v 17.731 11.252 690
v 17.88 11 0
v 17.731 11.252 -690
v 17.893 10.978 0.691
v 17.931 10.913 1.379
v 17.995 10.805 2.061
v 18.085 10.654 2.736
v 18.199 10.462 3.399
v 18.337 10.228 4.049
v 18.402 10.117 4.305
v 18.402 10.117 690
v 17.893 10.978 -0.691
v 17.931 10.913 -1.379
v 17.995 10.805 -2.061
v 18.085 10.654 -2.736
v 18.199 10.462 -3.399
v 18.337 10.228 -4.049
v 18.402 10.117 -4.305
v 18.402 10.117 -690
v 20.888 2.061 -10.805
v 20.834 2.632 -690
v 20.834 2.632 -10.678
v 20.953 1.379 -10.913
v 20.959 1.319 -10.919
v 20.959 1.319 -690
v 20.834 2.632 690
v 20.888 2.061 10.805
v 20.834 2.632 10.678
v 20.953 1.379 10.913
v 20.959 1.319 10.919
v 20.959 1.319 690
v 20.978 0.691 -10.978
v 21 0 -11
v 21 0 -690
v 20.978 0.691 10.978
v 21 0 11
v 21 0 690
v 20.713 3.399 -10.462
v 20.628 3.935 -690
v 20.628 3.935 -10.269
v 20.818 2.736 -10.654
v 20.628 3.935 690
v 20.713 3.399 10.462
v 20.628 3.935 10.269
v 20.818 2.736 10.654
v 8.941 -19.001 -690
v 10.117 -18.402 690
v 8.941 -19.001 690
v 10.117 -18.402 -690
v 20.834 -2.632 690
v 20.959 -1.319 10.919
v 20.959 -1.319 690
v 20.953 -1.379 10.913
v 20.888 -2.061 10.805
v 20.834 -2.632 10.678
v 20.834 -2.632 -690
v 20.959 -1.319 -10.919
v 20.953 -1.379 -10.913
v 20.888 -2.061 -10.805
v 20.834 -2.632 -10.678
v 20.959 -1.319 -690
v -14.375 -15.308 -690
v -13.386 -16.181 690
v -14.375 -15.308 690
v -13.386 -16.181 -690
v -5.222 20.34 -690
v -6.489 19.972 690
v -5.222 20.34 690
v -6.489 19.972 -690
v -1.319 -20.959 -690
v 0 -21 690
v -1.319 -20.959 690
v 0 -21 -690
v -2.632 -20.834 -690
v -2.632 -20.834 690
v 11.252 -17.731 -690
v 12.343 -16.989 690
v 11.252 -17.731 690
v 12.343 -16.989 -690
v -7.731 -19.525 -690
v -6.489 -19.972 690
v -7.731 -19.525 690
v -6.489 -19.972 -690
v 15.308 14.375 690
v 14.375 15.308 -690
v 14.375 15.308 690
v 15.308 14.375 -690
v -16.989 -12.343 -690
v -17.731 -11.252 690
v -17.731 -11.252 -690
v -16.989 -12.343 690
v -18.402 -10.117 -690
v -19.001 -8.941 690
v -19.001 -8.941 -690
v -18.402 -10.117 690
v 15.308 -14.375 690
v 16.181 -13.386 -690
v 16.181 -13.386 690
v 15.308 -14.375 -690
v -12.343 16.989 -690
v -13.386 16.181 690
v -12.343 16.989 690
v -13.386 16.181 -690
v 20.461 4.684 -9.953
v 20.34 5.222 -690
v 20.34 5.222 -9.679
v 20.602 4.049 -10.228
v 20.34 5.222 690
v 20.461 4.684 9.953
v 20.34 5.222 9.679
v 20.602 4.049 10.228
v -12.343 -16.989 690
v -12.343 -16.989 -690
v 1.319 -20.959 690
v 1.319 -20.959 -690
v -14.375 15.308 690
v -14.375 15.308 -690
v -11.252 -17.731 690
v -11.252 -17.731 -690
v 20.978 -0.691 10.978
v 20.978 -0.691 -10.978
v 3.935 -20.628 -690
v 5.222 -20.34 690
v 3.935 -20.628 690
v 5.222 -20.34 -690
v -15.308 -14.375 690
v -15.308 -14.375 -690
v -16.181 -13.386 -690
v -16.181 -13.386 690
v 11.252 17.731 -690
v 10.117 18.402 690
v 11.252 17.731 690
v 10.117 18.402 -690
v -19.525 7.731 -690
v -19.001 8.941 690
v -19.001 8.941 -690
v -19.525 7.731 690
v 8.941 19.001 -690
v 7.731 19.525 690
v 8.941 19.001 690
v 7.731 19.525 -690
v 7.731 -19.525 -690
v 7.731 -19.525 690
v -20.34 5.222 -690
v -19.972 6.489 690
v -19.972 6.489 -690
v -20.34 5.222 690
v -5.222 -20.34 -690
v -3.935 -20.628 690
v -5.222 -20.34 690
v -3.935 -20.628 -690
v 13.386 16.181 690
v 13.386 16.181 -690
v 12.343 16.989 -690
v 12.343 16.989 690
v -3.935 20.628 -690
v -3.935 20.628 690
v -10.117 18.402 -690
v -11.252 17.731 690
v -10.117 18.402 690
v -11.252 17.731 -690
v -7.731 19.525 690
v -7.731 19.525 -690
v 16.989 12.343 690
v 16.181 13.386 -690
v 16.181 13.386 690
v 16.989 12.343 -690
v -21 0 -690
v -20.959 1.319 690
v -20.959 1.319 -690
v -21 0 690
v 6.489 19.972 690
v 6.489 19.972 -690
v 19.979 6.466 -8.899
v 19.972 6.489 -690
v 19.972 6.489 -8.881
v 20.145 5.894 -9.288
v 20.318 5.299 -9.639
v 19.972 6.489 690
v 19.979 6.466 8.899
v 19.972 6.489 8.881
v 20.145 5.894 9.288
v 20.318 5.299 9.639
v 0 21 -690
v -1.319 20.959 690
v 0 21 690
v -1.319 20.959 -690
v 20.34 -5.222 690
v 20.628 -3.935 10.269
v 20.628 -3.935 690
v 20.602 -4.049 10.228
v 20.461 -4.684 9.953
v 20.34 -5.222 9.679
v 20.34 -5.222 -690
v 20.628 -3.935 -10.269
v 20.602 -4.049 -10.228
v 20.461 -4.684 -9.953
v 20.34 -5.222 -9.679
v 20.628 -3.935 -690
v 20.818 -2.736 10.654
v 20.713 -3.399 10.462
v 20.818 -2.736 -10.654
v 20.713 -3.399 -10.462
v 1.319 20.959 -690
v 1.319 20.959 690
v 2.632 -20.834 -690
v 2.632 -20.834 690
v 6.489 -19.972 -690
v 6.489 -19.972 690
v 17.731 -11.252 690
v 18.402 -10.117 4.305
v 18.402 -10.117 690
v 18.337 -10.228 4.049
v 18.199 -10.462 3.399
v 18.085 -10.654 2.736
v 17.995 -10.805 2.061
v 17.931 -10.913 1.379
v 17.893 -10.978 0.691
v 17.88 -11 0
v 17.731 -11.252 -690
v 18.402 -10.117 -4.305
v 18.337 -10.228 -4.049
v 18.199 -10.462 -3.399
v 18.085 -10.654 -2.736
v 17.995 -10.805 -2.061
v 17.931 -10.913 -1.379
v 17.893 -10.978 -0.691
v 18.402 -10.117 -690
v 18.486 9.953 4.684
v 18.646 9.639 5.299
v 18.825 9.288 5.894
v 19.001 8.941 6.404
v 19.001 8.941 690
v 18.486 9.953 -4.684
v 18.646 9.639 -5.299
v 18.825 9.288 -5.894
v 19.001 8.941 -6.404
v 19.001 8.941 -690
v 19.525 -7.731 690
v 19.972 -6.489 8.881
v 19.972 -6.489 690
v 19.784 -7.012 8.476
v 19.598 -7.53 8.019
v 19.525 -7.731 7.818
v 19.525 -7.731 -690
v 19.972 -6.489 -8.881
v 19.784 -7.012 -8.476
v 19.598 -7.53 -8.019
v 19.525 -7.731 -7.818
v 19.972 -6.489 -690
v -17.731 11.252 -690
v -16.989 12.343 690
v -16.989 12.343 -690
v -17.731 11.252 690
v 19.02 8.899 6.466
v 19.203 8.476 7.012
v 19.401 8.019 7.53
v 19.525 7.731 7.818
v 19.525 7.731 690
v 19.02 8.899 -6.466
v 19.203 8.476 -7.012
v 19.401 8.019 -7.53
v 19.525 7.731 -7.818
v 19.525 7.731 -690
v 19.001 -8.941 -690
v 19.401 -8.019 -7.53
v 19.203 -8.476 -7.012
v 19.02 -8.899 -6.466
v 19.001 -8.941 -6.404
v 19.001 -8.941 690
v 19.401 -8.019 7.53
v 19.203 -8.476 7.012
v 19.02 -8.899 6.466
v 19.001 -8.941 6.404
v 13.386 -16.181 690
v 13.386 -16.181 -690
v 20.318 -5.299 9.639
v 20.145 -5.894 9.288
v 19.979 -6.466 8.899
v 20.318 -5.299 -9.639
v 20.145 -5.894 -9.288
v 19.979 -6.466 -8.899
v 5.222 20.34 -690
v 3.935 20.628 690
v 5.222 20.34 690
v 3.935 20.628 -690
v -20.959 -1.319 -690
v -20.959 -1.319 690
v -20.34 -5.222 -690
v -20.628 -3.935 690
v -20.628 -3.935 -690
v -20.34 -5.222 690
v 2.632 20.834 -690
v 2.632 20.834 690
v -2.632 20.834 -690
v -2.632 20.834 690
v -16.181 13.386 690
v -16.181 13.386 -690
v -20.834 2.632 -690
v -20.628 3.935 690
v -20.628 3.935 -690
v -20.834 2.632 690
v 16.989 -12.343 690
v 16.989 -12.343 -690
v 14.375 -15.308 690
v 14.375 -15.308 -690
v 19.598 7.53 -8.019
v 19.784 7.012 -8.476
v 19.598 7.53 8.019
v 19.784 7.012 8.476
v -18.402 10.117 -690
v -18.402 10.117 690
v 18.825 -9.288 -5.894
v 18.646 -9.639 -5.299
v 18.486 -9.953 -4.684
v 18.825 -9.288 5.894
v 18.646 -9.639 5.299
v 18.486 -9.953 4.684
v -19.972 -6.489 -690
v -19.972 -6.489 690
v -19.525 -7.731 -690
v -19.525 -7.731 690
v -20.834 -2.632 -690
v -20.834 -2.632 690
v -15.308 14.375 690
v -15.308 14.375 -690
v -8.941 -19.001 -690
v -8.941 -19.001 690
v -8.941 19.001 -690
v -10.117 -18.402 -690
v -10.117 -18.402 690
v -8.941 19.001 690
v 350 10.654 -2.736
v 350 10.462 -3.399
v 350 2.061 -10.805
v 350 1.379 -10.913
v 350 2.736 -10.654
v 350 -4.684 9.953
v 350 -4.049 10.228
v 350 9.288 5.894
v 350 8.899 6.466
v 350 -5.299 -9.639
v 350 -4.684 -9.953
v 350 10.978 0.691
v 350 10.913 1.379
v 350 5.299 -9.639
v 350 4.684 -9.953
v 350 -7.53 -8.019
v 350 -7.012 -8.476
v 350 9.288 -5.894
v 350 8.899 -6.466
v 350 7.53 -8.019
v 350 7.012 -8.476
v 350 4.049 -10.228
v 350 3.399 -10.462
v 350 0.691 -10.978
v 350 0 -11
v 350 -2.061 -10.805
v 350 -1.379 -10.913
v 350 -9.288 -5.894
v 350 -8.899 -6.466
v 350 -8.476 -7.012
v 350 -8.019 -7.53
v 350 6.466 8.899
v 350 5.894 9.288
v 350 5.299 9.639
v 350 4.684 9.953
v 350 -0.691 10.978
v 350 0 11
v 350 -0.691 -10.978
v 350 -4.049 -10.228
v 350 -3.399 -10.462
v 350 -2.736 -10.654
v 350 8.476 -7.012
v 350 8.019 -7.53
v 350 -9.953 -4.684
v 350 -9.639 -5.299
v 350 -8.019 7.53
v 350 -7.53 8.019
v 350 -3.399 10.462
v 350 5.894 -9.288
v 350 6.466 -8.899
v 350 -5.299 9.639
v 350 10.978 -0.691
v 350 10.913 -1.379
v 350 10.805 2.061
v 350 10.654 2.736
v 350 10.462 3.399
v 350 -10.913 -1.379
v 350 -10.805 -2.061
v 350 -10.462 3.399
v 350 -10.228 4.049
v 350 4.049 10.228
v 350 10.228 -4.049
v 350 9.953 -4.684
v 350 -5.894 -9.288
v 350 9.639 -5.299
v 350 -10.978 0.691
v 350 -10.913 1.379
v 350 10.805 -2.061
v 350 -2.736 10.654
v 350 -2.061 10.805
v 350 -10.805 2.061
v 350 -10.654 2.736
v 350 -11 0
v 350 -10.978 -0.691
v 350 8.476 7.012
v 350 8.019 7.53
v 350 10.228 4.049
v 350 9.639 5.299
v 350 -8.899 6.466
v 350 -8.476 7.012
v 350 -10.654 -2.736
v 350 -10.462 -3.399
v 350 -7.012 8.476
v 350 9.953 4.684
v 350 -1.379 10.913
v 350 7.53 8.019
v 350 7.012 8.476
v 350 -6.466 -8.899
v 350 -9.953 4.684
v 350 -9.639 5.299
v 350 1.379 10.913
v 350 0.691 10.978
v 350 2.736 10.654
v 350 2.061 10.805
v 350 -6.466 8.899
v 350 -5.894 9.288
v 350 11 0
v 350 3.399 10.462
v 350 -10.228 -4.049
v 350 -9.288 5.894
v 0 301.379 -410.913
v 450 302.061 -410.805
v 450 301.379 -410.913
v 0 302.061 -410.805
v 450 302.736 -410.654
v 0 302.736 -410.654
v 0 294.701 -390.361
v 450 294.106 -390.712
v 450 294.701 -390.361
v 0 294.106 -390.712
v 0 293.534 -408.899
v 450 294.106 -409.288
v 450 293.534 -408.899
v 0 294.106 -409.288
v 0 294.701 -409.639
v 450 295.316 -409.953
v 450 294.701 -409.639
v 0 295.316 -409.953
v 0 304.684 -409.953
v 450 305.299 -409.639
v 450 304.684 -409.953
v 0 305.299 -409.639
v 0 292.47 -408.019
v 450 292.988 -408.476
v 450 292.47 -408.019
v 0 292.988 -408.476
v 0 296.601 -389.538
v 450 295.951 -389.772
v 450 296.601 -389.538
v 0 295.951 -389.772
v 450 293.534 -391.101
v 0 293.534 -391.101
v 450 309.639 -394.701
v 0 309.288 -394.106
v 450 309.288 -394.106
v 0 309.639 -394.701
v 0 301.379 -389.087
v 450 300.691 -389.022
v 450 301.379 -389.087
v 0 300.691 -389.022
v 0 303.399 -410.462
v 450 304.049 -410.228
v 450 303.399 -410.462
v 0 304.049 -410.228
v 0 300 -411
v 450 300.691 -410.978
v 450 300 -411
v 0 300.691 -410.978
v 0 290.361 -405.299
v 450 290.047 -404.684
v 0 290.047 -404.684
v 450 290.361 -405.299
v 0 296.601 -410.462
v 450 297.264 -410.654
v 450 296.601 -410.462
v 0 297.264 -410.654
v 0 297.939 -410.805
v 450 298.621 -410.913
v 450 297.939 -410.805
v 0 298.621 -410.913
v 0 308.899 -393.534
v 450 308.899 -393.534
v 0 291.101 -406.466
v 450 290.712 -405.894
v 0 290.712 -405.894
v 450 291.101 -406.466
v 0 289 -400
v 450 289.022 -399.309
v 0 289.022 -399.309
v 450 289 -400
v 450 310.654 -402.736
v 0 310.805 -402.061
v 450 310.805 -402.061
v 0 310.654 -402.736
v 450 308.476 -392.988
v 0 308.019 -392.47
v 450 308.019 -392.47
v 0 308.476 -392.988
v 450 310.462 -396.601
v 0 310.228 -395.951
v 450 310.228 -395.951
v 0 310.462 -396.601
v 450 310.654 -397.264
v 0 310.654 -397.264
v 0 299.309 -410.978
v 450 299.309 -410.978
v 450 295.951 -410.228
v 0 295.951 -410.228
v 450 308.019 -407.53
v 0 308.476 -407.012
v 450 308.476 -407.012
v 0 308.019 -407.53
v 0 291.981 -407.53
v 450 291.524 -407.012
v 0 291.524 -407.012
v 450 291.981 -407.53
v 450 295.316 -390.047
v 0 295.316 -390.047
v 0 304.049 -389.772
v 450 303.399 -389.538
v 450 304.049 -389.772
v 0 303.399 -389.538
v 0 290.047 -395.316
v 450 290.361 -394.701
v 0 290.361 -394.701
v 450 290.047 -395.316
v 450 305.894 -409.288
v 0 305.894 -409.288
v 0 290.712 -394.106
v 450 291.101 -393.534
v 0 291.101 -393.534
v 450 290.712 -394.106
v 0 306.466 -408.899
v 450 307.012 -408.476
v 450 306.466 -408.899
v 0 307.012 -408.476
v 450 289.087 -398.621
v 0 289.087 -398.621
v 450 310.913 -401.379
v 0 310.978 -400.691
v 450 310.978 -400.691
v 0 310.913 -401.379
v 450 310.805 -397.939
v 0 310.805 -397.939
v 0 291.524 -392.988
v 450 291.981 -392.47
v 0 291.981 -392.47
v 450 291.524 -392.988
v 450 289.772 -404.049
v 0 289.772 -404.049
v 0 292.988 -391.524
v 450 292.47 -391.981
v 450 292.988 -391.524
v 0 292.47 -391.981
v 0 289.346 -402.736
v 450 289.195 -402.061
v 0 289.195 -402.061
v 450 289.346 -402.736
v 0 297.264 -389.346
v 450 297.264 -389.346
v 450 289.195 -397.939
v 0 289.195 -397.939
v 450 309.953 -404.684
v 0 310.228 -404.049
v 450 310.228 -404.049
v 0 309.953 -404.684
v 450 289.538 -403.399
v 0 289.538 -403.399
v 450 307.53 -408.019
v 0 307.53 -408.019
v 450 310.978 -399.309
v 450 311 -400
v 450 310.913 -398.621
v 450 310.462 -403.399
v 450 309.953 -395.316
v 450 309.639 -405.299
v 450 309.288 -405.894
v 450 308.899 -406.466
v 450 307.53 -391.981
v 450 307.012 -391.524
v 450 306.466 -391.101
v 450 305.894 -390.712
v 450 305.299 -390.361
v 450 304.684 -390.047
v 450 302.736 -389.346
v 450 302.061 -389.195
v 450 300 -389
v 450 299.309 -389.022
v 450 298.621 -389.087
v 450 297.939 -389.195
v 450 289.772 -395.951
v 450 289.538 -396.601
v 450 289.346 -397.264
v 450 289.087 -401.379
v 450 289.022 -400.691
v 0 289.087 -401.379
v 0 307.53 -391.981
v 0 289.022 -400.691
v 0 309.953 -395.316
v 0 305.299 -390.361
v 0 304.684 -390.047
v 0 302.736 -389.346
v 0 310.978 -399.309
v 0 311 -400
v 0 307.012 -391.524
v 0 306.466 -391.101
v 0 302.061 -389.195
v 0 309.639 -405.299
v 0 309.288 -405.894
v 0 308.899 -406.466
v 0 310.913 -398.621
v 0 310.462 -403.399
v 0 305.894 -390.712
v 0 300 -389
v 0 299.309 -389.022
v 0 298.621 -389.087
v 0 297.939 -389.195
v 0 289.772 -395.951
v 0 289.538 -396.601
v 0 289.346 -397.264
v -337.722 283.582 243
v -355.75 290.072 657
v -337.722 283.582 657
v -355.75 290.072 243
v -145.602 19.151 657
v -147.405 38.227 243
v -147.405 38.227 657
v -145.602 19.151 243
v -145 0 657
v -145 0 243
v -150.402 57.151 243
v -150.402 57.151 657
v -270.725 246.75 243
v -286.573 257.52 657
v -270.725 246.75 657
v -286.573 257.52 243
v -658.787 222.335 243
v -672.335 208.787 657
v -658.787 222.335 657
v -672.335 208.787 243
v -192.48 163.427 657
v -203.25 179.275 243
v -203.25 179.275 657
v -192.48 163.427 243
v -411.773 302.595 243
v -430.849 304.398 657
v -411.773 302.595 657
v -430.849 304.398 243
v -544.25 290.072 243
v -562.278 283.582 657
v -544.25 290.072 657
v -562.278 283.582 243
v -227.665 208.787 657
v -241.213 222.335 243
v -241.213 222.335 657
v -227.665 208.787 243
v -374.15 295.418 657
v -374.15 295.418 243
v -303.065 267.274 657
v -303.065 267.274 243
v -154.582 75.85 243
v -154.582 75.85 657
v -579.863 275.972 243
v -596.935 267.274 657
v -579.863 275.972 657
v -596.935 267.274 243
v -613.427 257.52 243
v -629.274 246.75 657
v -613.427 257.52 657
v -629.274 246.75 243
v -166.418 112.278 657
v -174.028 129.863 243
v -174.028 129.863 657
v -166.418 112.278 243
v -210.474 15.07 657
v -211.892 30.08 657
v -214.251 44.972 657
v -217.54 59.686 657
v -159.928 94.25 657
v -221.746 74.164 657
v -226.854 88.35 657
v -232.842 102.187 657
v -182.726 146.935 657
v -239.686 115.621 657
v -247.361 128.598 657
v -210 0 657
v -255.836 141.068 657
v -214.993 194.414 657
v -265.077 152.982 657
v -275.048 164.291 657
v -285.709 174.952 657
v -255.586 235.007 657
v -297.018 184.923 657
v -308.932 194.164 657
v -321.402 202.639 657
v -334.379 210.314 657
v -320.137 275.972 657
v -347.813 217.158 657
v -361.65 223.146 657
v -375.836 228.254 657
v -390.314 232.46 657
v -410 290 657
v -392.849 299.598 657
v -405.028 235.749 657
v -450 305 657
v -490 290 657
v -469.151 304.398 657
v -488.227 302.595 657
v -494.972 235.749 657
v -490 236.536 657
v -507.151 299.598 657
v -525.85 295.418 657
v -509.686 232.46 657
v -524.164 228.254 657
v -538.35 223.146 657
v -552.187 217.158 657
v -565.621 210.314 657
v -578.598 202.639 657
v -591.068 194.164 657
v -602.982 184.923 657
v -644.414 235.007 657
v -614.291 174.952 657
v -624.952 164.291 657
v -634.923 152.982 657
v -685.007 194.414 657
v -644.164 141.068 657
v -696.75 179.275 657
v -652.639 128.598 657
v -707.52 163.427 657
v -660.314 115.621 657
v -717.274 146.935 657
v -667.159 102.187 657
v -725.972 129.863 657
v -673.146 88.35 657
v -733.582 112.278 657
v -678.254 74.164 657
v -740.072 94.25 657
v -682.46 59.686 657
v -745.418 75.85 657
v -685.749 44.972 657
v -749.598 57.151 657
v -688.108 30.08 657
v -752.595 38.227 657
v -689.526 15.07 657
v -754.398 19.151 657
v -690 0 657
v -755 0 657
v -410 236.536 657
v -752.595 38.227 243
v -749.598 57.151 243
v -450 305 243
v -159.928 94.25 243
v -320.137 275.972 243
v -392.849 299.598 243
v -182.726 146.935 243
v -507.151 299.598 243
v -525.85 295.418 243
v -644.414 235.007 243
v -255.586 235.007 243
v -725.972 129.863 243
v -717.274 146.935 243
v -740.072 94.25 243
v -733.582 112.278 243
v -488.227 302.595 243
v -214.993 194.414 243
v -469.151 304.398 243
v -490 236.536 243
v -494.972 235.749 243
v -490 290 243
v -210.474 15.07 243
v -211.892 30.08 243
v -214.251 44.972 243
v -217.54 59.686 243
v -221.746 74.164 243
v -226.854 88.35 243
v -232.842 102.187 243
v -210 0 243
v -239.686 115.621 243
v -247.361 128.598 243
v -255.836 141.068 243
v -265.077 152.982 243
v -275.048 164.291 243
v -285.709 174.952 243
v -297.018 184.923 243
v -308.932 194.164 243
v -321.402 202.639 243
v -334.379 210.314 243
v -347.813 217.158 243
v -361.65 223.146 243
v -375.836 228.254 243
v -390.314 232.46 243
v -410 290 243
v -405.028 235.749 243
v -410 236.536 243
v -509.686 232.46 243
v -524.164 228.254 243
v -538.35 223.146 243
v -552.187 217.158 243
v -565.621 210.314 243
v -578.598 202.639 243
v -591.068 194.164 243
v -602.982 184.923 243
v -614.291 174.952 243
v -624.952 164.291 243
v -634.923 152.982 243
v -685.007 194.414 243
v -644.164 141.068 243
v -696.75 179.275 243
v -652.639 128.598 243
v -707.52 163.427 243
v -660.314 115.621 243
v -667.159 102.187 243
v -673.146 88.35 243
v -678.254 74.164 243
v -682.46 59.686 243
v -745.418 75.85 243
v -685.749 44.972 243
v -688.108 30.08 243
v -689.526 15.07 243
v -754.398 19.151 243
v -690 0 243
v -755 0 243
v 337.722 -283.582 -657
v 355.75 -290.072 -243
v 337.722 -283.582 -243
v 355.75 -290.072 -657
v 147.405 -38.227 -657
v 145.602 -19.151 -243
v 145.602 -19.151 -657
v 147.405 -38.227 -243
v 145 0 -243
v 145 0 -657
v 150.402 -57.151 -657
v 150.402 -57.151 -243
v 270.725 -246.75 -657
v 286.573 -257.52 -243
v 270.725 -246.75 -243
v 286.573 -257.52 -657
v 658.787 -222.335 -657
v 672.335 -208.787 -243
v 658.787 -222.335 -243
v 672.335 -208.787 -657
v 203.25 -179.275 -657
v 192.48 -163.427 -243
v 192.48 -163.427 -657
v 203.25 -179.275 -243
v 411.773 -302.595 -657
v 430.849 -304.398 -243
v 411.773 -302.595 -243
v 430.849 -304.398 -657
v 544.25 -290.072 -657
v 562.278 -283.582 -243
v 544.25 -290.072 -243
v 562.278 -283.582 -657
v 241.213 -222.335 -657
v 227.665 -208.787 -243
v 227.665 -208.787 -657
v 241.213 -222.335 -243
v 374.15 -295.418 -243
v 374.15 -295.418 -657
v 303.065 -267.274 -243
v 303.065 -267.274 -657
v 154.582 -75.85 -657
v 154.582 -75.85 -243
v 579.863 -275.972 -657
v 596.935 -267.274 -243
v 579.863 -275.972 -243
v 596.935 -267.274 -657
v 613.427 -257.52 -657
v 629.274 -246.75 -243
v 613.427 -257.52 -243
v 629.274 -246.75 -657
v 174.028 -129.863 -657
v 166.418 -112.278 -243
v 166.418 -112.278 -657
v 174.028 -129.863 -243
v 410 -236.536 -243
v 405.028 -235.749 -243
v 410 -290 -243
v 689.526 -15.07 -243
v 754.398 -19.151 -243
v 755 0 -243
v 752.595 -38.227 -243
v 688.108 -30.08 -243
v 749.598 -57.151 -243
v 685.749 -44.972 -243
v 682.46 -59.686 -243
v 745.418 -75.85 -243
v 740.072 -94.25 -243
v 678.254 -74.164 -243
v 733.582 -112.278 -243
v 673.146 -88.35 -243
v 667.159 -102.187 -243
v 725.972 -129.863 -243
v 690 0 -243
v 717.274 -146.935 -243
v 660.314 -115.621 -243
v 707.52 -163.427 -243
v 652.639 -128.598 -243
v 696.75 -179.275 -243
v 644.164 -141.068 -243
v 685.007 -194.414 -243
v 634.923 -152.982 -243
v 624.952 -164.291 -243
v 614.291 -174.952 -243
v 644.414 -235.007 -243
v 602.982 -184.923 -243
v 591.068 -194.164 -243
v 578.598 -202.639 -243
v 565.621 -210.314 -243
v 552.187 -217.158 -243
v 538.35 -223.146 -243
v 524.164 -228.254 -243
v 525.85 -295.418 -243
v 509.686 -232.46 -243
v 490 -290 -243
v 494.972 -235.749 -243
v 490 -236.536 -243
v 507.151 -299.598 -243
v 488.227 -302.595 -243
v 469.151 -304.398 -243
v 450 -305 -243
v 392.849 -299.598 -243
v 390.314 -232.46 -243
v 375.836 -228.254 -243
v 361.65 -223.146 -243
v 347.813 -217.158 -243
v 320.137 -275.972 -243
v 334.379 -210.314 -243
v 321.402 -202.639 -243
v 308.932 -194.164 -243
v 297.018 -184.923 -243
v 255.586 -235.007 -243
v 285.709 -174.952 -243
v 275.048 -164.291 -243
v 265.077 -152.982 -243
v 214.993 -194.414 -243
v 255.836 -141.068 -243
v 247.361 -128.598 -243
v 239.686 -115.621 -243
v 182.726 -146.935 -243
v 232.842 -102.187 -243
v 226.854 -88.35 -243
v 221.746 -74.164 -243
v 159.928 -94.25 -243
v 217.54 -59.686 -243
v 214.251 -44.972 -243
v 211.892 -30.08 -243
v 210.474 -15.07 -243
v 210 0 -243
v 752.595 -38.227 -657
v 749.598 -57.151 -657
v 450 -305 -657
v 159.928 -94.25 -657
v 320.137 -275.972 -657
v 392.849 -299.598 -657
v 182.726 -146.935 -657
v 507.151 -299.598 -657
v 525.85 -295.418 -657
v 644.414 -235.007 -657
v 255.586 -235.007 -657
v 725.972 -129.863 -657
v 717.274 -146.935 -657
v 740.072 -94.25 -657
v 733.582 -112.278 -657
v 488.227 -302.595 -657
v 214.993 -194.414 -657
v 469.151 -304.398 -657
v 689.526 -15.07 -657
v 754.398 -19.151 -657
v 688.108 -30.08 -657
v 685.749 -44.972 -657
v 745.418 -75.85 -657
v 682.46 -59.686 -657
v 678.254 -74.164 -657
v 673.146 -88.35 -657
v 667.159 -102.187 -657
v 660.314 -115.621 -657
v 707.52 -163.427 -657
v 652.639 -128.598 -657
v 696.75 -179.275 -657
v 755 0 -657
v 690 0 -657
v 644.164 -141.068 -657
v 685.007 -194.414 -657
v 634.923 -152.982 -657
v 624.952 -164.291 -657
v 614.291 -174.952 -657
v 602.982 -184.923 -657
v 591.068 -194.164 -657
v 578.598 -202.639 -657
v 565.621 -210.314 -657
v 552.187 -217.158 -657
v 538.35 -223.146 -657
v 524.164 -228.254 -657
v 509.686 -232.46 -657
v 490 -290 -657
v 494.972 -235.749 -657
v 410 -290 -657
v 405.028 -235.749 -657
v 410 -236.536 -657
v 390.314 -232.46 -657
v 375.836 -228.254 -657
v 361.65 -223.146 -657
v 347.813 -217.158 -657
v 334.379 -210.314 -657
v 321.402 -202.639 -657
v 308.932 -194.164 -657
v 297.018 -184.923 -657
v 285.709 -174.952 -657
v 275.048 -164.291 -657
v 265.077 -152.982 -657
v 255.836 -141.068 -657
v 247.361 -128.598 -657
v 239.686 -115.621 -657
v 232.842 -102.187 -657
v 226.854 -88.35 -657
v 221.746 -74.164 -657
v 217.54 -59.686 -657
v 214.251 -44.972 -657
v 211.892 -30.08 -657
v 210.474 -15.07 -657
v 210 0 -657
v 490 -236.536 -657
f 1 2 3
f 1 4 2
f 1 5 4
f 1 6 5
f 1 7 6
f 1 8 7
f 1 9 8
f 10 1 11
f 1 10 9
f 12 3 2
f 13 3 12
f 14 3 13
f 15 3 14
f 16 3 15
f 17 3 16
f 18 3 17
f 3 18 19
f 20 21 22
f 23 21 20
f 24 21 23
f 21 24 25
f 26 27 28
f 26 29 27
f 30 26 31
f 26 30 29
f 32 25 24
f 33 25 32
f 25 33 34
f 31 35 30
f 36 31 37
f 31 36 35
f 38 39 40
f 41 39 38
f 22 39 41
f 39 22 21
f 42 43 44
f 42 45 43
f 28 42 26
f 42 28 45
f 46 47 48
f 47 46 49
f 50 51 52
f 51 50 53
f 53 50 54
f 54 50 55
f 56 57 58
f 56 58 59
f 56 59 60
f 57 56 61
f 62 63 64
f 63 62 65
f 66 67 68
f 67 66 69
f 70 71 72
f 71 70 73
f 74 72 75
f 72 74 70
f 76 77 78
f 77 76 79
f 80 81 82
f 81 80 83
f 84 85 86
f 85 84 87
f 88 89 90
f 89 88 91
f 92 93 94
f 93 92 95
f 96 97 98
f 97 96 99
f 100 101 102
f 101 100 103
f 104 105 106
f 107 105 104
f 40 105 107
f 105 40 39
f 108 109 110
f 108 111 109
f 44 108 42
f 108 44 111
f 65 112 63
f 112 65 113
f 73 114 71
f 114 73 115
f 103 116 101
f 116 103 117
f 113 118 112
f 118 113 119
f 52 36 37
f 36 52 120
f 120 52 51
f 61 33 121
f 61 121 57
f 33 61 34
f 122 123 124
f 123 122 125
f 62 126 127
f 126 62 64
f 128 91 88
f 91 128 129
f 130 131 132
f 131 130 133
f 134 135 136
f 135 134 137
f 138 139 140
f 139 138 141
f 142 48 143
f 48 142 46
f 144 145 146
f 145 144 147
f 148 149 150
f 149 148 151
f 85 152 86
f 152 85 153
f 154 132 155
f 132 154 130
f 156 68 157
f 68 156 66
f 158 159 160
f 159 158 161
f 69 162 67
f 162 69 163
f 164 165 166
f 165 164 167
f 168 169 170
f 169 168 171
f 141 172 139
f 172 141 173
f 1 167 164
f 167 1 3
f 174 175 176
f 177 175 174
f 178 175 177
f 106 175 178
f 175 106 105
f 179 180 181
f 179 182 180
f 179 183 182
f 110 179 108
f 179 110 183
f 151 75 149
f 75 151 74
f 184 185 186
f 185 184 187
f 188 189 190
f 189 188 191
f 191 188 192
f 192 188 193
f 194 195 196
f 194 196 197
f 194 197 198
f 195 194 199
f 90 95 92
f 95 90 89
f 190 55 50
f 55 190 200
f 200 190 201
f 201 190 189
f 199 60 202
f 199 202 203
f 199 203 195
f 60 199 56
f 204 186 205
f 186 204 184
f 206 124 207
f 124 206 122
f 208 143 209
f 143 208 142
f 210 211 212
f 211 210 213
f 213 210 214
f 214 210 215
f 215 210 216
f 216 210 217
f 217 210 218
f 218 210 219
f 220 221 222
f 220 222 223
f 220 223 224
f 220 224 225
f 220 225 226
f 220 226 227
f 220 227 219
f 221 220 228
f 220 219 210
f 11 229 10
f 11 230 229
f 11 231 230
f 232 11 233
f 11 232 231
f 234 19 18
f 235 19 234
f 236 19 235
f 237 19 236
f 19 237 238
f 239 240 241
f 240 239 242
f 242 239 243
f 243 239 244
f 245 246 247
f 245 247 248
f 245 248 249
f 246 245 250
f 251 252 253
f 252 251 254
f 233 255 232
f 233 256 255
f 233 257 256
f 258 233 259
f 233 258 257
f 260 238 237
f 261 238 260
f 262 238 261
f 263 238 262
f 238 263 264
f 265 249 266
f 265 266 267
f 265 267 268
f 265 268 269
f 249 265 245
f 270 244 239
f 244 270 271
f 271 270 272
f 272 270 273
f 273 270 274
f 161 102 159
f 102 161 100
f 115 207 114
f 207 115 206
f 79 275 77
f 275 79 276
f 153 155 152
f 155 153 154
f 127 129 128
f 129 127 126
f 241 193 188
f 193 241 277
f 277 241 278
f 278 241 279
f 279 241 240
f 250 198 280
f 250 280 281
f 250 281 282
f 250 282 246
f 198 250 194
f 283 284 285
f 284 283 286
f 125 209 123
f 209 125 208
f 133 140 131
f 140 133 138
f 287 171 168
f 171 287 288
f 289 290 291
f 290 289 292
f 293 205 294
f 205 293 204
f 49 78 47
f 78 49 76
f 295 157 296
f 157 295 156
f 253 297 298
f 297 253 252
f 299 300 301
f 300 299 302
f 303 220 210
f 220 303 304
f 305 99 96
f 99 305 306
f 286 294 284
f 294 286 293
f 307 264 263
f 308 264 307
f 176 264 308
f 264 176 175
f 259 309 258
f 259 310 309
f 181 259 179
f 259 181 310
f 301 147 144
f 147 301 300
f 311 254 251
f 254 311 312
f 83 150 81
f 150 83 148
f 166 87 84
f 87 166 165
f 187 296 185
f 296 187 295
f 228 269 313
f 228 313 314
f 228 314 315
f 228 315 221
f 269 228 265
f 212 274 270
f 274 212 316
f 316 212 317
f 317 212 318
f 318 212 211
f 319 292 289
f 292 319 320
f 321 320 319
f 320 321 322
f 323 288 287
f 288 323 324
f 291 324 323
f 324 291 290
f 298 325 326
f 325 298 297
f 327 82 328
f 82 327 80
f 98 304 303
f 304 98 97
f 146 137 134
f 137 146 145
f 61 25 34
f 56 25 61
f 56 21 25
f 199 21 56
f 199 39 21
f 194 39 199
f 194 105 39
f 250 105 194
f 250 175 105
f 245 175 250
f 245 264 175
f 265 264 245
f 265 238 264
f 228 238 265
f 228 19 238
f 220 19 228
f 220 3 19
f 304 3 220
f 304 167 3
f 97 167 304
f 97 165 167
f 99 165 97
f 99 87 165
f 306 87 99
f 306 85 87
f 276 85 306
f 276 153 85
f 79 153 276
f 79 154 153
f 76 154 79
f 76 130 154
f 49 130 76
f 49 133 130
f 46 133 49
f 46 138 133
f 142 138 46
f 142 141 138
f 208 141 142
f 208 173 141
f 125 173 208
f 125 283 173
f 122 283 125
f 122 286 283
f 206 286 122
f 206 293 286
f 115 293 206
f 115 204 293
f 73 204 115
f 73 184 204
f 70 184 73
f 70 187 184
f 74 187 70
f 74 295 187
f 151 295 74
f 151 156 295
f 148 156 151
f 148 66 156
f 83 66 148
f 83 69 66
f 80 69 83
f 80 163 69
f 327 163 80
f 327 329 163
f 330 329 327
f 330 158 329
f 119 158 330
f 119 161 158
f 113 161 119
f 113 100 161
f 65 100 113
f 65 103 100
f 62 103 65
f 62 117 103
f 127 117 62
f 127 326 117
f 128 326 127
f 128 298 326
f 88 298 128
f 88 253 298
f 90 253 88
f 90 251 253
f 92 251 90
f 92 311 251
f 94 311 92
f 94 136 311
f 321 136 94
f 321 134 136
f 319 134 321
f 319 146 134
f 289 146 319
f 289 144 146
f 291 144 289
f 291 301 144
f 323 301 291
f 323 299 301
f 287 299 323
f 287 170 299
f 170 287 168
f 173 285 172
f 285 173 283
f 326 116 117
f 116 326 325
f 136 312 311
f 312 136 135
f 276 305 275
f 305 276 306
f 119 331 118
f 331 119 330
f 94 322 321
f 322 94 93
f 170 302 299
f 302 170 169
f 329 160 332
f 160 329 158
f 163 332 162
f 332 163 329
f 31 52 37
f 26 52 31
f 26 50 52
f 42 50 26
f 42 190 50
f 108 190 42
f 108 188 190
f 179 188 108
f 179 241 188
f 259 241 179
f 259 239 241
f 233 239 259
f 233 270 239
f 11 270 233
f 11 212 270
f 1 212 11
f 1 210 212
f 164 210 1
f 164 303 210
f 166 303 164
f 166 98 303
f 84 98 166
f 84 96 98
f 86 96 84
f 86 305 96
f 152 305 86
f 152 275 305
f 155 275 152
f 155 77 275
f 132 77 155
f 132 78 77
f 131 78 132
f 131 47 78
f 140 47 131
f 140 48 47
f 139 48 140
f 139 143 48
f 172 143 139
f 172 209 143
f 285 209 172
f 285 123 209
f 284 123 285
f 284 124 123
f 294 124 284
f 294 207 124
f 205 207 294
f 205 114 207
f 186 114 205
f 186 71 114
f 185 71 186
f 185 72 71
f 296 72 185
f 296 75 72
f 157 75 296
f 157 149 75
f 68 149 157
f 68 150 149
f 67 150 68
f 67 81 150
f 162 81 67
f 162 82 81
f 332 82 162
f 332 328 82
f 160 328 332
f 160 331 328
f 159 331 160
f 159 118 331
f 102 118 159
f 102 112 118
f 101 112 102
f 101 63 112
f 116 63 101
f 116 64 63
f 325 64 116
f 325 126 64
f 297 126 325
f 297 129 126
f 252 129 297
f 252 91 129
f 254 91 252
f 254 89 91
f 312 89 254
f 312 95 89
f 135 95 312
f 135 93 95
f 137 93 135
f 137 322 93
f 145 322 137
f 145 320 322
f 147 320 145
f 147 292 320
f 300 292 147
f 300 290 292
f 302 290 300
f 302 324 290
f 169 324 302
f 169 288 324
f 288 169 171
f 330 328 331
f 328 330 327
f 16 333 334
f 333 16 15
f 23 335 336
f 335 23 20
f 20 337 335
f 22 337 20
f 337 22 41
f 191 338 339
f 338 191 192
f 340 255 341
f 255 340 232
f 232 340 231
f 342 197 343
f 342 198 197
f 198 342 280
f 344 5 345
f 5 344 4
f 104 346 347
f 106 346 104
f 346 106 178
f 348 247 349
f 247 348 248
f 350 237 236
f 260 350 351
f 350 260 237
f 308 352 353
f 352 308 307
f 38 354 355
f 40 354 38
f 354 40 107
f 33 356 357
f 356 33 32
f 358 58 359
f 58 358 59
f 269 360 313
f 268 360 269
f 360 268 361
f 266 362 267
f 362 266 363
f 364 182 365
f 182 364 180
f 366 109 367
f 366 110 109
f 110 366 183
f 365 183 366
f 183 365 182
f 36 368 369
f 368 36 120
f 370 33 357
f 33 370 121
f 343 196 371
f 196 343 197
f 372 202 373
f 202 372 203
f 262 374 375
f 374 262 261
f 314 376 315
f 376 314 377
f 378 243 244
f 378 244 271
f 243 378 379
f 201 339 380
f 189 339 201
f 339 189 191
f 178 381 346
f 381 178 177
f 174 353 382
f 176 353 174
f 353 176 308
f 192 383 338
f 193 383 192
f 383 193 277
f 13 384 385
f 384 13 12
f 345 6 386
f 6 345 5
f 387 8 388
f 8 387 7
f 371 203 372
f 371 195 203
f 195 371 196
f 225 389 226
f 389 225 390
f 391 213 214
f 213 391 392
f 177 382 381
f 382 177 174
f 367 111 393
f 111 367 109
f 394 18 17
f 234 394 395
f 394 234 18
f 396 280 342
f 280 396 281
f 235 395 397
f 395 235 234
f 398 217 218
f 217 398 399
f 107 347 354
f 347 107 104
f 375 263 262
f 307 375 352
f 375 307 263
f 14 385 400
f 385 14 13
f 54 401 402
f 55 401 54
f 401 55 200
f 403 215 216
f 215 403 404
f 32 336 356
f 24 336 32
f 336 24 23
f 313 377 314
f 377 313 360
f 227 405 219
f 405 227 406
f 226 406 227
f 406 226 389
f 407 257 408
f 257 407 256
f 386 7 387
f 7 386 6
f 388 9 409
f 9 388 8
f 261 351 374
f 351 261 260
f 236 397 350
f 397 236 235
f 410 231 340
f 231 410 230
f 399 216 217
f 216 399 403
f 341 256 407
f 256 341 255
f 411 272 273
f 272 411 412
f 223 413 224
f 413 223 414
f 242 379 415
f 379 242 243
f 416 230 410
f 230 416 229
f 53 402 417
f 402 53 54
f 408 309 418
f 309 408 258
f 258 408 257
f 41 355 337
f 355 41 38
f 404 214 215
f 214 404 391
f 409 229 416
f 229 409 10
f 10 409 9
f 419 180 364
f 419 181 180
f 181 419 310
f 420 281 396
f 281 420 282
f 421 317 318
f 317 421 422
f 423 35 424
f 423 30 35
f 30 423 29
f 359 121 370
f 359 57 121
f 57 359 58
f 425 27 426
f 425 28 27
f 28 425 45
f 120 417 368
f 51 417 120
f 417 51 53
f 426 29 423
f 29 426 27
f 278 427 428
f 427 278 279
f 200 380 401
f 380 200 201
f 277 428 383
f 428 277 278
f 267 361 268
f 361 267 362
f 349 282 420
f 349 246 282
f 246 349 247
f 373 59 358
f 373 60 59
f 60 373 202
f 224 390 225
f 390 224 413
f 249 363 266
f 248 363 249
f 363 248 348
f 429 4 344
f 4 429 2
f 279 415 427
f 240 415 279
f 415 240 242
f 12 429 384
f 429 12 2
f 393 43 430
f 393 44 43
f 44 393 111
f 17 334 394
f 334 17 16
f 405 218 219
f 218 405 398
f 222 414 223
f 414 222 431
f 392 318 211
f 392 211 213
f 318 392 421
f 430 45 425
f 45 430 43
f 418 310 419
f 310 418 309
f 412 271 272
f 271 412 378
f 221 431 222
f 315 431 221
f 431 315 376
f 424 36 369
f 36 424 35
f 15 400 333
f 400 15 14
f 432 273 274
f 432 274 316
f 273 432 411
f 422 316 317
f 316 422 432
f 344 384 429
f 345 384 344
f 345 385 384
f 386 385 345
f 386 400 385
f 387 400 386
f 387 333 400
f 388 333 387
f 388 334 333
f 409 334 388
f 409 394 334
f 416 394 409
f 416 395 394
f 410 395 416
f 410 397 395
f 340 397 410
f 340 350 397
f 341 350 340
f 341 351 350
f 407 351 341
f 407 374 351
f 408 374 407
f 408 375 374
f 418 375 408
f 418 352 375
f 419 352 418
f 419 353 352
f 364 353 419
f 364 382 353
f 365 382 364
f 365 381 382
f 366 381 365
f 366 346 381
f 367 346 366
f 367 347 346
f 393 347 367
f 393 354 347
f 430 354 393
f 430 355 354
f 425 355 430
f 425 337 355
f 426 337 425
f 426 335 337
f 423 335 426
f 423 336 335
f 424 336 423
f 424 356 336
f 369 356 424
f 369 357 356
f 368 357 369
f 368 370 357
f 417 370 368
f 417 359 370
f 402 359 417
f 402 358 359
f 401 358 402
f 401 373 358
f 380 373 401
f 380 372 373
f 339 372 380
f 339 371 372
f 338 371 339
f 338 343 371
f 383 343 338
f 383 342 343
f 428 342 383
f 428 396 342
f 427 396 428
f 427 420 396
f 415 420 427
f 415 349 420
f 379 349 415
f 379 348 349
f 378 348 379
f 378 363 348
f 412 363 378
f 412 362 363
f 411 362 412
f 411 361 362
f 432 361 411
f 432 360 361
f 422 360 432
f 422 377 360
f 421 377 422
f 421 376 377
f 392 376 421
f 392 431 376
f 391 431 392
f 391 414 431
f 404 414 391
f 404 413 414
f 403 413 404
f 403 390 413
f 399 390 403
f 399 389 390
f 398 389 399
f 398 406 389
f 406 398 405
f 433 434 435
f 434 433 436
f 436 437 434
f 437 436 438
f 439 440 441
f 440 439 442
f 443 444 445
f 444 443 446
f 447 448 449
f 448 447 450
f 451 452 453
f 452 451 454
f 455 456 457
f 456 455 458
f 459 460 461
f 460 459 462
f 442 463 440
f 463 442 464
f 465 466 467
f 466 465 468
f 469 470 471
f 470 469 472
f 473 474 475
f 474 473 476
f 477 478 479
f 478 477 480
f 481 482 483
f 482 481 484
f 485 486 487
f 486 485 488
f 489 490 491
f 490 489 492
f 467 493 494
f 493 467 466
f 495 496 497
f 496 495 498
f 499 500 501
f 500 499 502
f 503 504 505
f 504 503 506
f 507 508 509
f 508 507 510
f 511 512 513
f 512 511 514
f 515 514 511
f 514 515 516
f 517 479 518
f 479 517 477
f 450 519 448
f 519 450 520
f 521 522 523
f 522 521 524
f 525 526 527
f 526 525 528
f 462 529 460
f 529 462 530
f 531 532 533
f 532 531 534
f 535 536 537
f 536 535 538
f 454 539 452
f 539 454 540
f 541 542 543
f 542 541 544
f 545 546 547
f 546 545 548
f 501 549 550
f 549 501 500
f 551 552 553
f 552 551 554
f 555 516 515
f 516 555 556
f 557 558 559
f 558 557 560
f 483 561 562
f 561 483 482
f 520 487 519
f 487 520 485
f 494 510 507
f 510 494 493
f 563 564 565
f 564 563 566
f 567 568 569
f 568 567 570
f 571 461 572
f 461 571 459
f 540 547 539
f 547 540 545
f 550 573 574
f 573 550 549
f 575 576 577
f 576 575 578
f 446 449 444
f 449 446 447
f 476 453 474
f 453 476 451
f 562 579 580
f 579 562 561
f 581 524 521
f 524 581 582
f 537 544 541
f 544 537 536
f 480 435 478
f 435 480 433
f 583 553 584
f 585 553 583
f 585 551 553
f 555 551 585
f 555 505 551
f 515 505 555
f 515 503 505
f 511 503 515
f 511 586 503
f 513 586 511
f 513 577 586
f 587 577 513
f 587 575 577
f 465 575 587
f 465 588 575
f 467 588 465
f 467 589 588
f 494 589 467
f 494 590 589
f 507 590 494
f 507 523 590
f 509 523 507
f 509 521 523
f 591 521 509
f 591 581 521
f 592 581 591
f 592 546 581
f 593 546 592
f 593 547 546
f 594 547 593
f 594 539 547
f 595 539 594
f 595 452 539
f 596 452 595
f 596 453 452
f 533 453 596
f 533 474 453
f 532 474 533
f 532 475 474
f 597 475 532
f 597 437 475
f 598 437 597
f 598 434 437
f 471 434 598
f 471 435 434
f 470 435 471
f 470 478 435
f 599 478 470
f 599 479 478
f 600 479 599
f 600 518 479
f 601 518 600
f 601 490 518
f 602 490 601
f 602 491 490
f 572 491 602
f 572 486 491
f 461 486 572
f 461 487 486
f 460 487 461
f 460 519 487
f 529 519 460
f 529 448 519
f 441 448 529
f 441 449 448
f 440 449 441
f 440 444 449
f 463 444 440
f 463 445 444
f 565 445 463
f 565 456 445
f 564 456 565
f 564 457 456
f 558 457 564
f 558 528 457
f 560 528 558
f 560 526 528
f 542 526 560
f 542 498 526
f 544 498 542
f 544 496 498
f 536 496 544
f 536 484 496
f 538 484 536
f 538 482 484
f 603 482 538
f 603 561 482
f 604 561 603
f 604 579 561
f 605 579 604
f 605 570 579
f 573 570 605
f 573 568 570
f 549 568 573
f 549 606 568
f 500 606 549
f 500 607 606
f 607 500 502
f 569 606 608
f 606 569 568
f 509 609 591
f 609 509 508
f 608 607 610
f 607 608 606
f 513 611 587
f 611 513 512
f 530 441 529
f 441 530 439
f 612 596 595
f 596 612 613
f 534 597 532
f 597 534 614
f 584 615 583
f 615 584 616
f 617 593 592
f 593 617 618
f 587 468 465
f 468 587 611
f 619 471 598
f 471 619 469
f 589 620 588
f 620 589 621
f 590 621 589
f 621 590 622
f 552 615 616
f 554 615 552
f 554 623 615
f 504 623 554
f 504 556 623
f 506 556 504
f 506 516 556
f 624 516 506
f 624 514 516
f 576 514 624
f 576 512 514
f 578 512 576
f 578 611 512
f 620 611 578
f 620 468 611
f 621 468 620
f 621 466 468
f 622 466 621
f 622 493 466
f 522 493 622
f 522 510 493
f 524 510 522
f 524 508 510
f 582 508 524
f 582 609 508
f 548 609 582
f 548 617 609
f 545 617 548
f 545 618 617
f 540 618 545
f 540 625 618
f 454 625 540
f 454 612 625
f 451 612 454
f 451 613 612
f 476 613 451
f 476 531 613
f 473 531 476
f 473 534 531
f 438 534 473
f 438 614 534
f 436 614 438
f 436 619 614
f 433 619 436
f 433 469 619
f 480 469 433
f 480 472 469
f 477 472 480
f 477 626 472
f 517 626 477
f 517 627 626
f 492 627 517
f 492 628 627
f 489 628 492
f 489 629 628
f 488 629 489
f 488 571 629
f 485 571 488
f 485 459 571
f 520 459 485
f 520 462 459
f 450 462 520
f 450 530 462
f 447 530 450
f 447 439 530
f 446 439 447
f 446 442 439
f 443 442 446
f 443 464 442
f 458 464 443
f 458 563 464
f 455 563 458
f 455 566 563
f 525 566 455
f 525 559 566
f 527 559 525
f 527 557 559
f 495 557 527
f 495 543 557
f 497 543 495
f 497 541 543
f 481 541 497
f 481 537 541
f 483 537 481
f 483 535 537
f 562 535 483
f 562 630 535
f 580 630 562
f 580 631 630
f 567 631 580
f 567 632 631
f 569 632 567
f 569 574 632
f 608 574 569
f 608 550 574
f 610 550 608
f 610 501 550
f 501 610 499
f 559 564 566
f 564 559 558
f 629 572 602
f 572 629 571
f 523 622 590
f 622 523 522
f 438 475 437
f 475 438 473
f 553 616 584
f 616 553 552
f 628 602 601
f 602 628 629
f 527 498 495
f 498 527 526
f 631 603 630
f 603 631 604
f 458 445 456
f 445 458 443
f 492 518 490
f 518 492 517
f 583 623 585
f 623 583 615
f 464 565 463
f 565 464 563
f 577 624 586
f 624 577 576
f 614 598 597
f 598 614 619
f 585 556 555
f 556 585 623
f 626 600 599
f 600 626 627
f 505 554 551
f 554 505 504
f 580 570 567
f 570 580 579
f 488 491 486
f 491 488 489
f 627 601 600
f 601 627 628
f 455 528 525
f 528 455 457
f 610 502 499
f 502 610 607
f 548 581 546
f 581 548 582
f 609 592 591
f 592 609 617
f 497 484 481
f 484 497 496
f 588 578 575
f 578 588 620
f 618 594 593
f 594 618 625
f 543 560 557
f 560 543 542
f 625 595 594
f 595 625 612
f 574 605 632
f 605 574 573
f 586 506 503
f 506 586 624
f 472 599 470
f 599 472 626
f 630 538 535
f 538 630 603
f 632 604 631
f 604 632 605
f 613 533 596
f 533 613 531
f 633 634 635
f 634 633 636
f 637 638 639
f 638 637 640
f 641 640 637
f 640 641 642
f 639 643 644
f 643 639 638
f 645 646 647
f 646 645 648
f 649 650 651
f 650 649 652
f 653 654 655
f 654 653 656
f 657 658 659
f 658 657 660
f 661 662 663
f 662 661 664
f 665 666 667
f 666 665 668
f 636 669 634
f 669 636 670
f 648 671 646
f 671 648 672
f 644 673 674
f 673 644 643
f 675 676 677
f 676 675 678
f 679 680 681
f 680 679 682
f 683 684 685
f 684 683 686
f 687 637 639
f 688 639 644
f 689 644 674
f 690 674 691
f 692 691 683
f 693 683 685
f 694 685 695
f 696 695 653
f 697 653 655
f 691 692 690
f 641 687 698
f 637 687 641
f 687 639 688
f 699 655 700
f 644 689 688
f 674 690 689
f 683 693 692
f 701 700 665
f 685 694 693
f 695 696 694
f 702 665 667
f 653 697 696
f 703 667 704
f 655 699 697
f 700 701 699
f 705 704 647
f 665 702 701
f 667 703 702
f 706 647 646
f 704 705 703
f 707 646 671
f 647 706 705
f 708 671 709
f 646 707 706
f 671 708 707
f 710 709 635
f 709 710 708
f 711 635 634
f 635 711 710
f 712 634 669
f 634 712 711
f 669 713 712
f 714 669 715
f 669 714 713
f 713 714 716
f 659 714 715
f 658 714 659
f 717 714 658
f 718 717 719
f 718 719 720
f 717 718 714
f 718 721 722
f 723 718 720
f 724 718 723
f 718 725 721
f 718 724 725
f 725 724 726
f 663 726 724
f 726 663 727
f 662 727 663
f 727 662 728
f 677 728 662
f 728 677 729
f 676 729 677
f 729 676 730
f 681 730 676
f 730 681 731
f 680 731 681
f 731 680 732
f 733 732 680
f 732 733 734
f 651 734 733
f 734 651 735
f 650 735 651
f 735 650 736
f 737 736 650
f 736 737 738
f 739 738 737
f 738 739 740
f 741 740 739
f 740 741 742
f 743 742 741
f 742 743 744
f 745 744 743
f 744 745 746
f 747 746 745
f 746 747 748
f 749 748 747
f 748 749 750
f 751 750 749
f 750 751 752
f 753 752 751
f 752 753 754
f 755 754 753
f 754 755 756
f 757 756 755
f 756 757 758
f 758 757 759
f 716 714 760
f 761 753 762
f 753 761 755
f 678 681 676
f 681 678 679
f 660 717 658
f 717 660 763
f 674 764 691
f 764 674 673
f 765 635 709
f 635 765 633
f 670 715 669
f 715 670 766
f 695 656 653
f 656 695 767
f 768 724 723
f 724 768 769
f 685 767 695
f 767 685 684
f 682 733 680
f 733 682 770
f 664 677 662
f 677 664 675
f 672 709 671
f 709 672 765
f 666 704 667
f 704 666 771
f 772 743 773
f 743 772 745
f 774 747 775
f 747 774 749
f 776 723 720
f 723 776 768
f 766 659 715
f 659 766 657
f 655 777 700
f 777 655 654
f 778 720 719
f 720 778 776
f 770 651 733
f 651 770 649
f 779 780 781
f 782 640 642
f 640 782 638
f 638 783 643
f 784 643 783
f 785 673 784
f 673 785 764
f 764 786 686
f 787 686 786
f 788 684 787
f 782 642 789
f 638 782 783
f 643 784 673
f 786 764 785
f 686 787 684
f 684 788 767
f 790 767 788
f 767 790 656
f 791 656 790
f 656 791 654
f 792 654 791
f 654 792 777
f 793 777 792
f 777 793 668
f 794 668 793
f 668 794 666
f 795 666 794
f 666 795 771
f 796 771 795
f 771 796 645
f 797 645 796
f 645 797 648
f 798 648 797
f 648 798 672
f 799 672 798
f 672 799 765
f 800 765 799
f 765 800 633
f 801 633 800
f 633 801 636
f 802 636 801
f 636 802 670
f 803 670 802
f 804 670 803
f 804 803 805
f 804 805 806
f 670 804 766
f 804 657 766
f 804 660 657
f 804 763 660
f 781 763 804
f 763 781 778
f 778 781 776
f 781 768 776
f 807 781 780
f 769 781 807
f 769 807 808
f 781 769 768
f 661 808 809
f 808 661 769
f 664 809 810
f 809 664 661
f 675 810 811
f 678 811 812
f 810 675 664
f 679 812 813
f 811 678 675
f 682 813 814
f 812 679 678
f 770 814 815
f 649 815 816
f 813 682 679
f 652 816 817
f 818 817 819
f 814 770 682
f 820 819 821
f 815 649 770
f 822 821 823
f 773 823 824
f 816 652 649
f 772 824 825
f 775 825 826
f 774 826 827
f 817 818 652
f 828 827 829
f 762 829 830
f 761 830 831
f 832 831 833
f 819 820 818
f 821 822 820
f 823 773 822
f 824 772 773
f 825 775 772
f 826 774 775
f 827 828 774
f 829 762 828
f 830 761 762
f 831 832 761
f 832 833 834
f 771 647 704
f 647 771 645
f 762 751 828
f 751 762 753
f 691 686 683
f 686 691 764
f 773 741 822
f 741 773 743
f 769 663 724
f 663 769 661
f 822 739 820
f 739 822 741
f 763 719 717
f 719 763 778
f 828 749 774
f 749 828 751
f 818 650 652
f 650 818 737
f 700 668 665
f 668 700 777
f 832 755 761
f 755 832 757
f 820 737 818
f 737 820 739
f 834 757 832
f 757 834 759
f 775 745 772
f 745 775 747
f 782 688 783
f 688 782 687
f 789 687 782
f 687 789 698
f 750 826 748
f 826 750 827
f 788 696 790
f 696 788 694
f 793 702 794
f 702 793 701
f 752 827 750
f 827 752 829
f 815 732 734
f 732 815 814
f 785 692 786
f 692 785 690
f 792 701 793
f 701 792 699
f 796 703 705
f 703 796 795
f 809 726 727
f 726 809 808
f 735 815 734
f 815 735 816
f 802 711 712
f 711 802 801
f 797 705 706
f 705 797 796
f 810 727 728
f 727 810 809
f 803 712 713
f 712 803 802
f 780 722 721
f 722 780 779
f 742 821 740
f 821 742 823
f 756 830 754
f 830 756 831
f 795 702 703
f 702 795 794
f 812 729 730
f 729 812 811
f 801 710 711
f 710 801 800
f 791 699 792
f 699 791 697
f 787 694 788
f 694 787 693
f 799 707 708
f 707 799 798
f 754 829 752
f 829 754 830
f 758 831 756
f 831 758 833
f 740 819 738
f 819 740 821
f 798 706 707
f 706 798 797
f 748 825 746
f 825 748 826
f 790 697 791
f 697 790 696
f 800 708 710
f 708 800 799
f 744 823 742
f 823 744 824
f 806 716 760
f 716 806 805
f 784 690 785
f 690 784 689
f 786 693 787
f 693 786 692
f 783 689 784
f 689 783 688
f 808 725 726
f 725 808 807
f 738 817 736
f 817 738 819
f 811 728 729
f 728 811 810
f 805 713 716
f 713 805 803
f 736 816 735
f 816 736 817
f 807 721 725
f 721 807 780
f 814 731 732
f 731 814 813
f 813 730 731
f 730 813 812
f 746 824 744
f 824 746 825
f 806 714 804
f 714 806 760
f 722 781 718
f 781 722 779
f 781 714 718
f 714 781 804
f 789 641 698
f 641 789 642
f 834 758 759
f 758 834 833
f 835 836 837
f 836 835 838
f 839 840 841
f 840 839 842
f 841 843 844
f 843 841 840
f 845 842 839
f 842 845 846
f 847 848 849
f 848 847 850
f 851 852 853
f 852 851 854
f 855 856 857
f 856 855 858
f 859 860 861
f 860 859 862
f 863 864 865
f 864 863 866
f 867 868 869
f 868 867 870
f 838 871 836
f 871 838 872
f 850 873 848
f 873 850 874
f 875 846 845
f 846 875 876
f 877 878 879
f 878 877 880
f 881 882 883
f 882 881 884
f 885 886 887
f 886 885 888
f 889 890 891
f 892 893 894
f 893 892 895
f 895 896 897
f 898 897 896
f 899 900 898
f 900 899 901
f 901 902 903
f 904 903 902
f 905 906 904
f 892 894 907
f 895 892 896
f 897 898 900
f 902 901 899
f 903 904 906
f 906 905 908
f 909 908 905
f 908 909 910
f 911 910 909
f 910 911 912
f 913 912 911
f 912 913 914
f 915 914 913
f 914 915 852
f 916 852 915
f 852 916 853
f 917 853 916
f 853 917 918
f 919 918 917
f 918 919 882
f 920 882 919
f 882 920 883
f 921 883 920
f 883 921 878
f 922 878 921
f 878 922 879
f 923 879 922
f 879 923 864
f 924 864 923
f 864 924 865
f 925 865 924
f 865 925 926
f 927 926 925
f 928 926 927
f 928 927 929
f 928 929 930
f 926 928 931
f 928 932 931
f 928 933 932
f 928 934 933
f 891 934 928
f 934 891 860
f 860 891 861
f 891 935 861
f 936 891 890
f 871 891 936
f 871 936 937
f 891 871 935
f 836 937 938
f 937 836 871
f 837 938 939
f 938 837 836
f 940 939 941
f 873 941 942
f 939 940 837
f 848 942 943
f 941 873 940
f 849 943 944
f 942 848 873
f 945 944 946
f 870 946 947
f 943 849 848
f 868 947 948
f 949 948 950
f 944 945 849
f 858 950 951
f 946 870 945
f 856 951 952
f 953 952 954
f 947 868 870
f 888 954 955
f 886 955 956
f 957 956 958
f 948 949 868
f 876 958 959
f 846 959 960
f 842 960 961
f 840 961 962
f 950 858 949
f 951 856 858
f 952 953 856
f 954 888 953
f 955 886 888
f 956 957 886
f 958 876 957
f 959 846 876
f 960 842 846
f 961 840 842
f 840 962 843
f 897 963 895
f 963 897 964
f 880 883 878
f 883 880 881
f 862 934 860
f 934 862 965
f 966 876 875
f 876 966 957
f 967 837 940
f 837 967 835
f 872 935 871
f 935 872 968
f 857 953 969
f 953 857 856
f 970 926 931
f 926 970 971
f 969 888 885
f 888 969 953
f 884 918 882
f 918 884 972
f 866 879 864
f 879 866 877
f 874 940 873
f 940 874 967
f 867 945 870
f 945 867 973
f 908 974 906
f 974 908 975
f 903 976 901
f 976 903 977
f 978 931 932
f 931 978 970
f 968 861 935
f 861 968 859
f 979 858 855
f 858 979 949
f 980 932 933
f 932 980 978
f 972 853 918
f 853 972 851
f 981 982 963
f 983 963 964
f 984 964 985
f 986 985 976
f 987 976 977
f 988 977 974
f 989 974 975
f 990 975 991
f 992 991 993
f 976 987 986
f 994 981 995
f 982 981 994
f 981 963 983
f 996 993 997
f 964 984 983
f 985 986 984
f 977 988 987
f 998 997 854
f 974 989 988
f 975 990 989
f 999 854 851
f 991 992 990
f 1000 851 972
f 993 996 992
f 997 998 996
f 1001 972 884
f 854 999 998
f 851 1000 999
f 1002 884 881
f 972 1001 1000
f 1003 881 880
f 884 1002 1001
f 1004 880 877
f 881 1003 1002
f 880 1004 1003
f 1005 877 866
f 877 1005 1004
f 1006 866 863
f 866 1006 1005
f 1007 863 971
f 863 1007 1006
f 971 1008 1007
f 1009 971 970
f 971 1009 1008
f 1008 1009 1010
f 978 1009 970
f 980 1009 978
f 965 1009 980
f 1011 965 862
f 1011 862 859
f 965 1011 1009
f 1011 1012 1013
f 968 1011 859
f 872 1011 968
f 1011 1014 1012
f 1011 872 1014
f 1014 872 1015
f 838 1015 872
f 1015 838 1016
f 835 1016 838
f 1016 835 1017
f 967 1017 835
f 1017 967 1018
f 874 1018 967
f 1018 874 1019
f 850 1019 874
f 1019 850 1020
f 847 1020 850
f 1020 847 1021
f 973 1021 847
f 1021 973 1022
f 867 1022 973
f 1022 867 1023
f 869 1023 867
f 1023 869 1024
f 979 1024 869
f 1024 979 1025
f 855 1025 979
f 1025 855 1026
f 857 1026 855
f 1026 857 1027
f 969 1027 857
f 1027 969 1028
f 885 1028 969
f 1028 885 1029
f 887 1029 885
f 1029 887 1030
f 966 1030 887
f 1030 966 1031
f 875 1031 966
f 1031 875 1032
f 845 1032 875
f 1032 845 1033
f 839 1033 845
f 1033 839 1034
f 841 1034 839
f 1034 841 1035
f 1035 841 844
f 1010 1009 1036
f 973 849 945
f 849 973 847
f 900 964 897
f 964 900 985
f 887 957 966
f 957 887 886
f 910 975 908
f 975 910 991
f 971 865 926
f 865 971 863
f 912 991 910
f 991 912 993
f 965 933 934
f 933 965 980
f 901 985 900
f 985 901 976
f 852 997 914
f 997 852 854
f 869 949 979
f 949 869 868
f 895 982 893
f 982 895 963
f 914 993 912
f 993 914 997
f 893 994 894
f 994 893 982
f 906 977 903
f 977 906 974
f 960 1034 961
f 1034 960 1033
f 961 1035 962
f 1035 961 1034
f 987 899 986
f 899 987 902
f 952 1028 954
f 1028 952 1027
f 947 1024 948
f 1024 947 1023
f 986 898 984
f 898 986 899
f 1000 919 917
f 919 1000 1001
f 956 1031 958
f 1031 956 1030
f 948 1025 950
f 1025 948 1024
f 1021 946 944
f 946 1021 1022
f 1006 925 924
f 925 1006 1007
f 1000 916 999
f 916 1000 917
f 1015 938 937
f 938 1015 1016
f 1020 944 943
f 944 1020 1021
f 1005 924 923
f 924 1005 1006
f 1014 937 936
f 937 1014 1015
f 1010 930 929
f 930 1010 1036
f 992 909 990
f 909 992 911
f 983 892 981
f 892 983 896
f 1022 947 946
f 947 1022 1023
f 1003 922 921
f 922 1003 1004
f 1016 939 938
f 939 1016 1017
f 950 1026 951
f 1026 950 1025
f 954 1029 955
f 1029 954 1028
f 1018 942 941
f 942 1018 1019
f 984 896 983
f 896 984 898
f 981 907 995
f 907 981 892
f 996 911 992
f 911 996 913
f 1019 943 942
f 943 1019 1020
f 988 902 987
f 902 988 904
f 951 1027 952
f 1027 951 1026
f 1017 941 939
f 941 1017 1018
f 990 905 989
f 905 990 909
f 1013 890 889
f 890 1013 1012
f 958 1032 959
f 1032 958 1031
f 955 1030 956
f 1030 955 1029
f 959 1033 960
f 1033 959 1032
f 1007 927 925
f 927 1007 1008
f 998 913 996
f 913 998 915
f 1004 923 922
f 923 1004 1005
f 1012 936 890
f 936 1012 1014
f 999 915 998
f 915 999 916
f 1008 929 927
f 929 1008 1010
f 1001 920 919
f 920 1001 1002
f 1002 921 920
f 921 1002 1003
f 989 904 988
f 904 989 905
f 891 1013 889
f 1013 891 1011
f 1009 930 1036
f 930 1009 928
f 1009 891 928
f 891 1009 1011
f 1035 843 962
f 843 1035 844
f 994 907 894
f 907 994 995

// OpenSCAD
// ============================================================================
// PROJECT: XXXG-00W0 WING GUNDAM ZERO EW - SHOULDER INNER BACKBONE INFRA
// COMPONENT VAULT: BANDAI CAST RUNNER G - SHOULDER BLOCKS G11 & G12
// PACKAGING RE-ARCHITECTURE: SUB-ARMOR CAPACITOR RECESSED BANK INTEGRATION
// CONFIG METRIC: SCALED TITANIUM CASTS WITH CYCLOIDAL SLOTS (1:1 ACTUAL METRIC)
// ============================================================================

$fn = 100; // High-precision circular resolution segment count

// Structural Constants Scaled 1:1 for a 16.7-Meter Airframe Scale (mm)
block_total_length = 920;                // Total longitudinal vertical height (mm)
pivot_bore_diameter = 480;               // Core cycloidal stabilizer pin width (mm)
armor_skin_thickness = 65;              // Solid TiAl protective plating wall (mm)
harness_conduit_width = 80;             // Cast-in 4oz copper logic trace track (mm)
capacitor_pocket_depth = 15;            // Sub-armor recessed housing pocket depth (mm)
capacitor_pocket_width = 140;           // Transverse MLCC array pocket width (mm)

module Runner_G_Shoulder_Block_Forge() {
    // Central Supply Injection Runner Axis (Molten Feed Line from Siphon Forge)
    color([0.22, 0.22, 0.25]) {
        cylinder(h = block_total_length * 1.5, d = 42, center = true);
        // Direct injection gates tracking straight into the part mold cavities
        translate([0, 0, 0]) rotate([0, 90, 0]) cylinder(h = 350, d = 22);
        translate([0, 300, -400]) rotate([0, 90, 0]) cylinder(h = 450, d = 22);
    }
    
    // Instantiate Scaled Skeutomorphic Part Molds Symmetrically (Left & Right)
    Cast_Internal_Shoulder_Blocks();
}

module Cast_Internal_Shoulder_Blocks() {
    // ---- PART G11: INTERNAL LEFT STRUCTURAL UPPER SHOULDER ARTICULATION BLOCK ----
    translate([-450, 0, 450]) color([0.35, 0.35, 0.38]) { // Inner Frame Dark Spec
        difference() {
            // Main solid heavy-duty core joint connection block segment
            cylinder(h = block_total_length * 0.45, d = pivot_bore_diameter + (armor_skin_thickness * 2), center = true);
            
            // Central Cycloidal Reduction Track Bore (Houses pre-loaded alignment pins)
            cylinder(h = block_total_length * 0.5, d = pivot_bore_diameter, center = true);
            
            // SUB-ARMOR RECESSED CAPACITOR POCKETS [Segmented rows cut inside the armor inner wall]
            for (z_offset = [-120, 0, 120]) {
                translate([0, (pivot_bore_diameter/2 - armor_skin_thickness + capacitor_pocket_depth/2), z_offset])
                    cube([capacitor_pocket_width, capacitor_pocket_depth, 100], center = true);
            }
            
            // Continuous cast-in routing track for the 4oz solid-state wiring rails
            cube([harness_conduit_width, pivot_bore_diameter + 100, block_total_length], center = true);
            
            // Slicing profile tool to generate an asymmetrical half-shell part component
            translate([0, -pivot_bore_diameter, 0])
                cube([pivot_bore_diameter * 2, pivot_bore_diameter * 2, block_total_length * 2], center = true);
        }
    }
    
    // ---- PART G12: INTERNAL RIGHT STRUCTURAL UPPER SHOULDER ARTICULATION BLOCK ----
    translate([450, 0, -450]) rotate([0, 0, 180]) color([0.35, 0.35, 0.38]) {
        difference() {
            cylinder(h = block_total_length * 0.45, d = pivot_bore_diameter + (armor_skin_thickness * 2), center = true);
            cylinder(h = block_total_length * 0.5, d = pivot_bore_diameter, center = true);
            
            for (z_offset = [-120, 0, 120]) {
                translate([0, (pivot_bore_diameter/2 - armor_skin_thickness + capacitor_pocket_depth/2), z_offset])
                    cube([capacitor_pocket_width, capacitor_pocket_depth, 100], center = true);
            }
            
            cube([harness_conduit_width, pivot_bore_diameter + 100, block_total_length], center = true);
            translate([0, -pivot_bore_diameter, 0])
                cube([pivot_bore_diameter * 2, pivot_bore_diameter * 2, block_total_length * 2], center = true);
        }
    }
}

// Render Master Assembly to Parameter Workspace
Runner_G_Shoulder_Block_Forge();
